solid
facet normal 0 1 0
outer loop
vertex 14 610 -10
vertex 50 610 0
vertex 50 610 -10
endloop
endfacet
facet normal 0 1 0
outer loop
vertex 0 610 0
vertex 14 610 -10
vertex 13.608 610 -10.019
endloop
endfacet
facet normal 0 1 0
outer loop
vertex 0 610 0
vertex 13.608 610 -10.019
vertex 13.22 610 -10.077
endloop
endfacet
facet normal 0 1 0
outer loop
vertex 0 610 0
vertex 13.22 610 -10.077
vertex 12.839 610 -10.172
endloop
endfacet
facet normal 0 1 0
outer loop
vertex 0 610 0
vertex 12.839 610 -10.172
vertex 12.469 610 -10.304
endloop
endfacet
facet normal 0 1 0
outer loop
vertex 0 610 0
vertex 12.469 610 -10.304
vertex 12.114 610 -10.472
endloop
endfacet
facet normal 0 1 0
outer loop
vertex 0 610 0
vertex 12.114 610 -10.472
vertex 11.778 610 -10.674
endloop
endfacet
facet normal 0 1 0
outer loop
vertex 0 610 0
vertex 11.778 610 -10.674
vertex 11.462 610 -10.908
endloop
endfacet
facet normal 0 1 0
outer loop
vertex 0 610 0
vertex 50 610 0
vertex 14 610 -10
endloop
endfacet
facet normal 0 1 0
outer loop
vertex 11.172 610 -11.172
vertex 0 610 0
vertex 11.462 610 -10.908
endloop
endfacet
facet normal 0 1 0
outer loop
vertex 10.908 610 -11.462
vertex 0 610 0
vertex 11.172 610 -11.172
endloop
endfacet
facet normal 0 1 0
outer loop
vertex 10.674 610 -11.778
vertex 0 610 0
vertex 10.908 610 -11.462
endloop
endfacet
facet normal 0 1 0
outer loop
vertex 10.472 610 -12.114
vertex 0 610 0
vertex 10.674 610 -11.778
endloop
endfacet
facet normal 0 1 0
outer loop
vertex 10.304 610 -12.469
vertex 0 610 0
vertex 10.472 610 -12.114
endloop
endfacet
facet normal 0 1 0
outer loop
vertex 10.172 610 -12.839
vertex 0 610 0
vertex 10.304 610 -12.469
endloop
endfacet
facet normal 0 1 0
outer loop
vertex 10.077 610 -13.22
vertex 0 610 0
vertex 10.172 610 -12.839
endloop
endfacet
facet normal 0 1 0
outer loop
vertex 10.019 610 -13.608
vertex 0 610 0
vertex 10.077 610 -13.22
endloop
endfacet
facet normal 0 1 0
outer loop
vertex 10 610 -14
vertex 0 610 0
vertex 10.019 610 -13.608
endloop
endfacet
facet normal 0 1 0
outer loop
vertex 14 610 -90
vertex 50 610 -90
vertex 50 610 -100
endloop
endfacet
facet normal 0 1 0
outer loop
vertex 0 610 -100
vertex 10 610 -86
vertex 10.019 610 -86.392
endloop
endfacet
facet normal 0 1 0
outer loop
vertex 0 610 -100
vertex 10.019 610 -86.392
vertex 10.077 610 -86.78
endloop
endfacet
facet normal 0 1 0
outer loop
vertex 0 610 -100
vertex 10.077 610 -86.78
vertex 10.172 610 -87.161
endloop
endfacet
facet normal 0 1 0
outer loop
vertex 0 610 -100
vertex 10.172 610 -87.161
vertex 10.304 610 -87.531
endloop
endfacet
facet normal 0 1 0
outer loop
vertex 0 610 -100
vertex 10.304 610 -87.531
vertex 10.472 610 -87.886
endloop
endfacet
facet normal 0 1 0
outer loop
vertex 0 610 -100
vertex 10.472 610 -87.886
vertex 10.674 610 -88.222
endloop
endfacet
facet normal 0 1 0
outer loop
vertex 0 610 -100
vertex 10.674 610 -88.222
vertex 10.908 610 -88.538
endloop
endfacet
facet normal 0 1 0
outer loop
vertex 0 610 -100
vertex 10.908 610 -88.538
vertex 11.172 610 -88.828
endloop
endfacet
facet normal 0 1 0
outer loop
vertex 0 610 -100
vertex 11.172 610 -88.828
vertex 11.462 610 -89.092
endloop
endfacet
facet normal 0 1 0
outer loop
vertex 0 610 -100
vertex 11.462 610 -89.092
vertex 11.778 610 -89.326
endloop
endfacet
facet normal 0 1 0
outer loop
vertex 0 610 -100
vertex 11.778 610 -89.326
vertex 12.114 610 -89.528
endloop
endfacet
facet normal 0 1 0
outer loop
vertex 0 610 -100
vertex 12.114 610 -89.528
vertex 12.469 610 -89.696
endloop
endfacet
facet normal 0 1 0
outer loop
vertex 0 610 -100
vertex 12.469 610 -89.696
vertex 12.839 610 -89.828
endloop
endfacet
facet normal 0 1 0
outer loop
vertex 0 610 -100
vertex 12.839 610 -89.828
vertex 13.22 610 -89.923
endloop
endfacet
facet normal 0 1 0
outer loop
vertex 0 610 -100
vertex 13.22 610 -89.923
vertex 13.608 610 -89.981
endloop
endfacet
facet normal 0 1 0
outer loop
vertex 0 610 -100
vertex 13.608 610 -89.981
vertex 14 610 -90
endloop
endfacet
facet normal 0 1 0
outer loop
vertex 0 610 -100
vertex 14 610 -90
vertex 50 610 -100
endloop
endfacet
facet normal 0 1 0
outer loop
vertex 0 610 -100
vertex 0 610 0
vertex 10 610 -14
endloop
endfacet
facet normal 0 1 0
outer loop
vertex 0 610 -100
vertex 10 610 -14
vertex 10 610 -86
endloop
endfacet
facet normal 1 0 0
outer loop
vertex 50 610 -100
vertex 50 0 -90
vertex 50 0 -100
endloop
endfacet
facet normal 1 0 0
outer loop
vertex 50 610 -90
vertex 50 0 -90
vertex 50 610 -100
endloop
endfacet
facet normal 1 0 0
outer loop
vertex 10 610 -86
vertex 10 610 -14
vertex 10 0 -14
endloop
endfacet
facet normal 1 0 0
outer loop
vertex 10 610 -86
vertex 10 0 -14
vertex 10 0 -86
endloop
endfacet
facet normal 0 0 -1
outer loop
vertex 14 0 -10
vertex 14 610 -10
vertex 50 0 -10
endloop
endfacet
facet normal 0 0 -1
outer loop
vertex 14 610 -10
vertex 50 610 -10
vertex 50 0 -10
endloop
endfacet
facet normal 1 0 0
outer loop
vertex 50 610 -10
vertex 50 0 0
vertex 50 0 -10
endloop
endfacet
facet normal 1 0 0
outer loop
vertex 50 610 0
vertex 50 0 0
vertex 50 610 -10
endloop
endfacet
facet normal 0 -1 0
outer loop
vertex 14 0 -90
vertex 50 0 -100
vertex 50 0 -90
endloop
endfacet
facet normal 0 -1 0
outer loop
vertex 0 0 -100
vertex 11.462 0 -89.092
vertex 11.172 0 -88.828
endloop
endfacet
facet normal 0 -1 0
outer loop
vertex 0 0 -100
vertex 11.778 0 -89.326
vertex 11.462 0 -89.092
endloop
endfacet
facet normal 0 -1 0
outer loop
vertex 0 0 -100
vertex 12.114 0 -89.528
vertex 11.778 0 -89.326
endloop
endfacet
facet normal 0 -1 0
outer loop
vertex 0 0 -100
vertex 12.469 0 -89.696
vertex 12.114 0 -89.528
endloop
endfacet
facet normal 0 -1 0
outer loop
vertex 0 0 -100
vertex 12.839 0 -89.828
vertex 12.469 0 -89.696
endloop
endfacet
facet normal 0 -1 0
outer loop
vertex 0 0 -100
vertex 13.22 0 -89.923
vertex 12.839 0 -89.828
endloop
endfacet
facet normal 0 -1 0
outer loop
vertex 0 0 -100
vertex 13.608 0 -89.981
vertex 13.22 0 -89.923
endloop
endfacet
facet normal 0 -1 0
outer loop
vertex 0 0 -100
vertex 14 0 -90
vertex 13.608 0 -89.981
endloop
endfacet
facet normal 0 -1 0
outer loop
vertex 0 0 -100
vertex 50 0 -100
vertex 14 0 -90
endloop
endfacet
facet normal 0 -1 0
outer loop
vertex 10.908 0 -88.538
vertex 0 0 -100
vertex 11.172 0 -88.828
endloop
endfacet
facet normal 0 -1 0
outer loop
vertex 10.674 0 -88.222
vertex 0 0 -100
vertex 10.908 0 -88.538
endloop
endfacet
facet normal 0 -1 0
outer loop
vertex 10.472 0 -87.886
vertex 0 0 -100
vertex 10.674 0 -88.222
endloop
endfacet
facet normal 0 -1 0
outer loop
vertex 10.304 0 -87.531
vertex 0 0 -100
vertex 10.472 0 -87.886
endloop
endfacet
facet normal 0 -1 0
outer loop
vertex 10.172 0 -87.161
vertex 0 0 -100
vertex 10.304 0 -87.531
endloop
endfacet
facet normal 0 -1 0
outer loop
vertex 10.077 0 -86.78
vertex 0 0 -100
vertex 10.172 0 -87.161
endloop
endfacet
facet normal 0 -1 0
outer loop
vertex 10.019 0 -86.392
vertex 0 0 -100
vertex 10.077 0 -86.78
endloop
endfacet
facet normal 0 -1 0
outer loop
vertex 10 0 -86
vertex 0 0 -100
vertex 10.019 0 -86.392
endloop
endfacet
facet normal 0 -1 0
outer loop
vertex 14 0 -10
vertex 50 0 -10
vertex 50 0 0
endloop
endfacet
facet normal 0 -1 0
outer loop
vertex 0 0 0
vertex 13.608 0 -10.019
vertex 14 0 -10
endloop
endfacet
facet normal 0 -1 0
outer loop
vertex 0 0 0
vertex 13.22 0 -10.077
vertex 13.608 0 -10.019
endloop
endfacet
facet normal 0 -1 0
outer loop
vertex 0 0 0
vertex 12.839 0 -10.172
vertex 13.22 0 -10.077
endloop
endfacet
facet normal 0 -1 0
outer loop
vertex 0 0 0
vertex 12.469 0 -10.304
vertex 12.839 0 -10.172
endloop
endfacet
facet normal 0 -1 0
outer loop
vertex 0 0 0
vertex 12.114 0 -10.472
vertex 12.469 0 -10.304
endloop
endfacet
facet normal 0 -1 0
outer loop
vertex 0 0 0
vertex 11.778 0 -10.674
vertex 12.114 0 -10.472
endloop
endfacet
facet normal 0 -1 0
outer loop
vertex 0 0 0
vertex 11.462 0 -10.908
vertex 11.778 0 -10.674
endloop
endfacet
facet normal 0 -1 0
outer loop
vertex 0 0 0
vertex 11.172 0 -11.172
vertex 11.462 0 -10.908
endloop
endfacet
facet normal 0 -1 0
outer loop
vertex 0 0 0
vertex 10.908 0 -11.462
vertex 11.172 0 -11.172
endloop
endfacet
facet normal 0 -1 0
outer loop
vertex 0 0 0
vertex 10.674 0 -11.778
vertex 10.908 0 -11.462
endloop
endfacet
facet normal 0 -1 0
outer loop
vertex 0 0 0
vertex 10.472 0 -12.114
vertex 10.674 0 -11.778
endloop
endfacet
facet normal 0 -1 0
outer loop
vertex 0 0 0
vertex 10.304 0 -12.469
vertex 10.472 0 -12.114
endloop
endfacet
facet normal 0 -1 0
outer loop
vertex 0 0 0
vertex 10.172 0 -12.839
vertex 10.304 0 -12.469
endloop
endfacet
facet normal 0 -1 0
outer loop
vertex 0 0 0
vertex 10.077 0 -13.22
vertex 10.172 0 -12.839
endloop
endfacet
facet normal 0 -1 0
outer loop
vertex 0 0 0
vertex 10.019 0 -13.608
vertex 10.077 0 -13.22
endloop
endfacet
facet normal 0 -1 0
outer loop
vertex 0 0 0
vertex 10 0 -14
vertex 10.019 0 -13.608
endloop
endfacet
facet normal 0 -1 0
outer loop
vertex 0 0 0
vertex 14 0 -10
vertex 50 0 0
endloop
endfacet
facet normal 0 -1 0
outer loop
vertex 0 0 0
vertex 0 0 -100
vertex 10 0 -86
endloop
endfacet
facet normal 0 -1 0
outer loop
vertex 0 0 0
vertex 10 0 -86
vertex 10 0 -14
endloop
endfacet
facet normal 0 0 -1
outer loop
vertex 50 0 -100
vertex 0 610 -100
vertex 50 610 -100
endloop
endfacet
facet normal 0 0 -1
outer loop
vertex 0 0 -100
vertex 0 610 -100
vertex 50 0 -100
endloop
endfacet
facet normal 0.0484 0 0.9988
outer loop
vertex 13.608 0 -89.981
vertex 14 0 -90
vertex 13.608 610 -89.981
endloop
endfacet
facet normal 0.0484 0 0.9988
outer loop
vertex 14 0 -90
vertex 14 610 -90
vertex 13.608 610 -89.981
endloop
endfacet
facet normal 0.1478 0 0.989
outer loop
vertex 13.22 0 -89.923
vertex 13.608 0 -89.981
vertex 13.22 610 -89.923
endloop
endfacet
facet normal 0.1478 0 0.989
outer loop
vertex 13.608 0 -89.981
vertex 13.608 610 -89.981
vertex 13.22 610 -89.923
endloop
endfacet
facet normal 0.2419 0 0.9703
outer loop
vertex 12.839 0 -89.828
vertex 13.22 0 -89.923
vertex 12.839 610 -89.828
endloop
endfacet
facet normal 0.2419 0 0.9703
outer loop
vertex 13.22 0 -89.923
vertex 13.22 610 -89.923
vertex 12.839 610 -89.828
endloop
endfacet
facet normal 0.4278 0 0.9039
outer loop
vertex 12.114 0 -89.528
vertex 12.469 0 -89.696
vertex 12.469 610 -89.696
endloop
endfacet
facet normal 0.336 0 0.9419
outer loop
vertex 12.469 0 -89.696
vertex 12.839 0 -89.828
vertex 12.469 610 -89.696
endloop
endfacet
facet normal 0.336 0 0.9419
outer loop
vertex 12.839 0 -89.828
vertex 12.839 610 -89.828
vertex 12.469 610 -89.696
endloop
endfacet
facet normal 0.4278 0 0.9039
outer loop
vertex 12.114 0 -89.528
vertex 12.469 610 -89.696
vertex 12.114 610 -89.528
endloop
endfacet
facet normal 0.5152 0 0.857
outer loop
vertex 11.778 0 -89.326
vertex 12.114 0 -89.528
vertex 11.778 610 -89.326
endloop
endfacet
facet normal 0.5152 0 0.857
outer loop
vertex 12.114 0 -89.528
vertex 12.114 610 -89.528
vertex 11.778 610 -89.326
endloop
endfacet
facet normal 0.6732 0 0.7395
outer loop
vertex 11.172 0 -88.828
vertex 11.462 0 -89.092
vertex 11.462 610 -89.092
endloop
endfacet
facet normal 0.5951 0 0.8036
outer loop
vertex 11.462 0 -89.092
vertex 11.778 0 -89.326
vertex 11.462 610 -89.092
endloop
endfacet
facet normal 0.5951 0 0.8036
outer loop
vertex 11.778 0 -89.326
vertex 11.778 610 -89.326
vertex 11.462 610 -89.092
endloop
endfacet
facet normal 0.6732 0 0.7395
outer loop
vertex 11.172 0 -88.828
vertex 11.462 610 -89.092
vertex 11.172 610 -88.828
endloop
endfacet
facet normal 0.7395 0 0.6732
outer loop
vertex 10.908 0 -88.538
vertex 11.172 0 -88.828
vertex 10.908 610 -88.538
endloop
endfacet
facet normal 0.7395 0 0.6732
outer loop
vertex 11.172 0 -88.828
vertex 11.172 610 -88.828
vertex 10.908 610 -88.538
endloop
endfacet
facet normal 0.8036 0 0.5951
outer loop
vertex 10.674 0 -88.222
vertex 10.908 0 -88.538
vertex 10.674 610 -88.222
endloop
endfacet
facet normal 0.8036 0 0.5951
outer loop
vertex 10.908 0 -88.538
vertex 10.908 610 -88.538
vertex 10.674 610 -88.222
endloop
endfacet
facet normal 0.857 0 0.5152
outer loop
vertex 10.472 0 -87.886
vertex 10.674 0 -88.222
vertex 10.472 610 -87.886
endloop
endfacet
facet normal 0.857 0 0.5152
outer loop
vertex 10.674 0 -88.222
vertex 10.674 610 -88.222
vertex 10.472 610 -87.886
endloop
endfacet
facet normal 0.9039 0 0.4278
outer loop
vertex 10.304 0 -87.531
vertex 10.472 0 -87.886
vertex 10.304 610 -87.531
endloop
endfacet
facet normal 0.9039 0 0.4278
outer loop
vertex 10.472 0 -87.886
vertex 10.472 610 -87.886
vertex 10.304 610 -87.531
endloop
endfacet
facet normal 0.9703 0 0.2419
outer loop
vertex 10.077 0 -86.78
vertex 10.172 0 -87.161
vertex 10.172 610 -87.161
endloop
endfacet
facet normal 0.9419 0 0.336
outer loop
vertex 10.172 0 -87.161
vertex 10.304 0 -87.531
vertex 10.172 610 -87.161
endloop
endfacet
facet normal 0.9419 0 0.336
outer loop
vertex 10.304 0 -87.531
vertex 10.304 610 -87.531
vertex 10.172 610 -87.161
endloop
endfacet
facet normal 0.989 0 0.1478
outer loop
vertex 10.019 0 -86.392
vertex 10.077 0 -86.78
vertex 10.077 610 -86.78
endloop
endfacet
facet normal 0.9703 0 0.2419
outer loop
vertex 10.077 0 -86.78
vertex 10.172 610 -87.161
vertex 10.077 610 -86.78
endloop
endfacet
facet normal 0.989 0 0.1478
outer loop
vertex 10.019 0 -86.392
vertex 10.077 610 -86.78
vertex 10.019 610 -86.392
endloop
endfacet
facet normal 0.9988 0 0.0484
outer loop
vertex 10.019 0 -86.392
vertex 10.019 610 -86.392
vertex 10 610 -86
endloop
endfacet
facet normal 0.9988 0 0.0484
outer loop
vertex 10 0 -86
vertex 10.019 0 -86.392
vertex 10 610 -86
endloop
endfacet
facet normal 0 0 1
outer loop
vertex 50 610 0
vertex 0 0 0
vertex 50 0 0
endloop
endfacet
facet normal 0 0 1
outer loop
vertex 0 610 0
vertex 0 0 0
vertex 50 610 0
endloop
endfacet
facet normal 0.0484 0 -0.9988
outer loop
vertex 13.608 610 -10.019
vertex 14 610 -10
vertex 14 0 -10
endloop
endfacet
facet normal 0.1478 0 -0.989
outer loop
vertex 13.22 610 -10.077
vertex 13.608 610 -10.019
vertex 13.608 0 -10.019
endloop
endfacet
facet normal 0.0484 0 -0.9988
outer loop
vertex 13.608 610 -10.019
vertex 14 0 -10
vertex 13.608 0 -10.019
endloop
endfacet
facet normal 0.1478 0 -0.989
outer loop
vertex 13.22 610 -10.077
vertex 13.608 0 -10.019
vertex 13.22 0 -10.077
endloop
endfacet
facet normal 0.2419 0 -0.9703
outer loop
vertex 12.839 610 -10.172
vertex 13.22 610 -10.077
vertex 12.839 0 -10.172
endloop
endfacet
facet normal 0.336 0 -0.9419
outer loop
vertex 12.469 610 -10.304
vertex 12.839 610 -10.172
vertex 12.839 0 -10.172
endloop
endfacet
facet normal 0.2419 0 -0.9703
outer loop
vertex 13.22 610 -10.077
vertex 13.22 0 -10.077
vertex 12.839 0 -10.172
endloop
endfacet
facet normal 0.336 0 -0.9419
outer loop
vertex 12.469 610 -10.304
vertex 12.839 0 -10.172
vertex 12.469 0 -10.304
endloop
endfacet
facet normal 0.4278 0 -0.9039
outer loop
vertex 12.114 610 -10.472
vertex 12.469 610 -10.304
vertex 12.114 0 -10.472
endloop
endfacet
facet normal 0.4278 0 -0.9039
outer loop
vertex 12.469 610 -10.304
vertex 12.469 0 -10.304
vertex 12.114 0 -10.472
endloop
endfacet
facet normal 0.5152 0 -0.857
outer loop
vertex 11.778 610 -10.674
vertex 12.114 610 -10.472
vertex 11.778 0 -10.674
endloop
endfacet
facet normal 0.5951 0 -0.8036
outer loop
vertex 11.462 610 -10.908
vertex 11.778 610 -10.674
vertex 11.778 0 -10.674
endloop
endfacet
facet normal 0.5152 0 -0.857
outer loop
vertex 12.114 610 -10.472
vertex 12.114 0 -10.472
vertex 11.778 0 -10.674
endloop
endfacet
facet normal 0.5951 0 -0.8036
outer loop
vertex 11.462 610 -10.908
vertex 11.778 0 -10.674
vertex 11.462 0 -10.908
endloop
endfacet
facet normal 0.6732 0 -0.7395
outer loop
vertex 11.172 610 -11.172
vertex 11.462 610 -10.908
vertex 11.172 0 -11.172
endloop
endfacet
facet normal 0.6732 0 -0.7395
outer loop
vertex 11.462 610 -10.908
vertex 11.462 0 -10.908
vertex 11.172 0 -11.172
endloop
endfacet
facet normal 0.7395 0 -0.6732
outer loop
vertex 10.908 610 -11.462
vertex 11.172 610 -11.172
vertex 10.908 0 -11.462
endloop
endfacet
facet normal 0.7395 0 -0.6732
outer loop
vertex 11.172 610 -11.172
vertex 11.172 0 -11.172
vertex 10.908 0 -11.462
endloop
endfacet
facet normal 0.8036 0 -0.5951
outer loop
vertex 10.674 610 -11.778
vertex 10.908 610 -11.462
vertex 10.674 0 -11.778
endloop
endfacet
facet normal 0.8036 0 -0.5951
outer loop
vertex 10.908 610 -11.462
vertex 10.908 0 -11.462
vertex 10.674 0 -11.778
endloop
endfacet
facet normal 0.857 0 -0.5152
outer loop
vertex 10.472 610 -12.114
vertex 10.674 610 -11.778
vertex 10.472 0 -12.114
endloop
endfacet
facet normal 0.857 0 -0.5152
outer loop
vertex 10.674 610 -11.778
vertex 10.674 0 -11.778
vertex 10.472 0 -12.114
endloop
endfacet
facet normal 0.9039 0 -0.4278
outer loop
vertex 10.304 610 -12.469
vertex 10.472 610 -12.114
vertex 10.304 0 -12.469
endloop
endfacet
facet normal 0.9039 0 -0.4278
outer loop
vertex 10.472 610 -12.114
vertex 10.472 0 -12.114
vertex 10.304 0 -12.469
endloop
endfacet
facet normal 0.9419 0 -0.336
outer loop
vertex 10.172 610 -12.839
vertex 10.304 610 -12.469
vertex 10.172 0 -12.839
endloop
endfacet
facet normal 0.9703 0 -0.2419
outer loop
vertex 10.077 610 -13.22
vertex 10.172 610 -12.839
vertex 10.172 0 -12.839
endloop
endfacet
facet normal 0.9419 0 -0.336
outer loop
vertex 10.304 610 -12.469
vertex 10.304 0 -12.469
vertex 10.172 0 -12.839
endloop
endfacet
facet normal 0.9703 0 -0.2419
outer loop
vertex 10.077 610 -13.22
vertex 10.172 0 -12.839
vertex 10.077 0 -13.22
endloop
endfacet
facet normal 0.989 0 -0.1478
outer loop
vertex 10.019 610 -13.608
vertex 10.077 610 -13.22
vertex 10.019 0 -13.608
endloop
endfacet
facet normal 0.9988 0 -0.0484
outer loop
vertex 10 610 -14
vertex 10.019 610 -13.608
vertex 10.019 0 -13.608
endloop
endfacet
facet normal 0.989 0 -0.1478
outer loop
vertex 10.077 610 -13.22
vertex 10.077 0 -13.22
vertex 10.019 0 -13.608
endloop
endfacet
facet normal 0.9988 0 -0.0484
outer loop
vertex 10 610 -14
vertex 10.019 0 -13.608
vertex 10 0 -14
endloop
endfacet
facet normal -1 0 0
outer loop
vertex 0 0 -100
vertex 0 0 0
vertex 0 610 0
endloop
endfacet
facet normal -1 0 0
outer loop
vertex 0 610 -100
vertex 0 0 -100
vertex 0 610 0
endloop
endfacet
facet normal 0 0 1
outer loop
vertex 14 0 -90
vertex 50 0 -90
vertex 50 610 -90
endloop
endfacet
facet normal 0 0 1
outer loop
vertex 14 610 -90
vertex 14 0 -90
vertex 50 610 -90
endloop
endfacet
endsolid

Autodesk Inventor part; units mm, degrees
ref_plane "YZ Plane" through (0, 0, 0) normal (1, 0, 0) x (0, 1, 0)
ref_plane "XZ Plane" through (0, 0, 0) normal (0, 1, 0) x (-1, 0, 0)
ref_plane "XY Plane" through (0, 0, 0) normal (0, 0, 1) x (1, 0, 0)
sketch "Sketch1" plane through (0, 0, 0) normal (1, 0, 0) x (0, 1, 0)
  line L0 (0, 0) -> (610, 0)
  line L1 (610, 0) -> (610, -100)
  line L2 (610, -100) -> (0, -100)
  line L3 (0, -100) -> (0, 0)
  dimension "d0" = 610
  dimension "d1" = 100
extrude "Extrusion1" add sketch "Sketch1" along normal blind 50
sketch "Sketch2" plane through (50, 0, 0) normal (1, 0, 0) x (0, 0, -1)
  line L0 (0, 0) -> (100, 0) projected
  line L1 (100, 610) -> (0, 610) projected
  line L2 (10, 0) -> (90, 0)
  line L3 (90, 0) -> (90, 610)
  line L4 (90, 610) -> (10, 610)
  line L5 (10, 610) -> (10, 0)
  dimension "d4" = 80
extrude "Extrusion2" cut sketch "Sketch2" against normal blind 40
fillet "Fillet1" radius 4 2 edges at (10, 305, -90) (10, 305, -10)
equation "\"BendRadius\" = Thickness"
equation "\"BendReliefWidth\" = Thickness"
equation "\"BendReliefDepth\" = 0.5 * Thickness"
equation "\"CornerReliefSize\" = 4 * Thickness"
equation "\"MinimumRemnant\" = 2 * Thickness"
equation "\"TransitionRadius\" = BendRadius"
equation "\"JacobiRadiusSize\" = BendRadius"
equation "\"GapSize\" = Thickness"
equation "\"Thickness\" = 0.5"
properties part number "Base3"
